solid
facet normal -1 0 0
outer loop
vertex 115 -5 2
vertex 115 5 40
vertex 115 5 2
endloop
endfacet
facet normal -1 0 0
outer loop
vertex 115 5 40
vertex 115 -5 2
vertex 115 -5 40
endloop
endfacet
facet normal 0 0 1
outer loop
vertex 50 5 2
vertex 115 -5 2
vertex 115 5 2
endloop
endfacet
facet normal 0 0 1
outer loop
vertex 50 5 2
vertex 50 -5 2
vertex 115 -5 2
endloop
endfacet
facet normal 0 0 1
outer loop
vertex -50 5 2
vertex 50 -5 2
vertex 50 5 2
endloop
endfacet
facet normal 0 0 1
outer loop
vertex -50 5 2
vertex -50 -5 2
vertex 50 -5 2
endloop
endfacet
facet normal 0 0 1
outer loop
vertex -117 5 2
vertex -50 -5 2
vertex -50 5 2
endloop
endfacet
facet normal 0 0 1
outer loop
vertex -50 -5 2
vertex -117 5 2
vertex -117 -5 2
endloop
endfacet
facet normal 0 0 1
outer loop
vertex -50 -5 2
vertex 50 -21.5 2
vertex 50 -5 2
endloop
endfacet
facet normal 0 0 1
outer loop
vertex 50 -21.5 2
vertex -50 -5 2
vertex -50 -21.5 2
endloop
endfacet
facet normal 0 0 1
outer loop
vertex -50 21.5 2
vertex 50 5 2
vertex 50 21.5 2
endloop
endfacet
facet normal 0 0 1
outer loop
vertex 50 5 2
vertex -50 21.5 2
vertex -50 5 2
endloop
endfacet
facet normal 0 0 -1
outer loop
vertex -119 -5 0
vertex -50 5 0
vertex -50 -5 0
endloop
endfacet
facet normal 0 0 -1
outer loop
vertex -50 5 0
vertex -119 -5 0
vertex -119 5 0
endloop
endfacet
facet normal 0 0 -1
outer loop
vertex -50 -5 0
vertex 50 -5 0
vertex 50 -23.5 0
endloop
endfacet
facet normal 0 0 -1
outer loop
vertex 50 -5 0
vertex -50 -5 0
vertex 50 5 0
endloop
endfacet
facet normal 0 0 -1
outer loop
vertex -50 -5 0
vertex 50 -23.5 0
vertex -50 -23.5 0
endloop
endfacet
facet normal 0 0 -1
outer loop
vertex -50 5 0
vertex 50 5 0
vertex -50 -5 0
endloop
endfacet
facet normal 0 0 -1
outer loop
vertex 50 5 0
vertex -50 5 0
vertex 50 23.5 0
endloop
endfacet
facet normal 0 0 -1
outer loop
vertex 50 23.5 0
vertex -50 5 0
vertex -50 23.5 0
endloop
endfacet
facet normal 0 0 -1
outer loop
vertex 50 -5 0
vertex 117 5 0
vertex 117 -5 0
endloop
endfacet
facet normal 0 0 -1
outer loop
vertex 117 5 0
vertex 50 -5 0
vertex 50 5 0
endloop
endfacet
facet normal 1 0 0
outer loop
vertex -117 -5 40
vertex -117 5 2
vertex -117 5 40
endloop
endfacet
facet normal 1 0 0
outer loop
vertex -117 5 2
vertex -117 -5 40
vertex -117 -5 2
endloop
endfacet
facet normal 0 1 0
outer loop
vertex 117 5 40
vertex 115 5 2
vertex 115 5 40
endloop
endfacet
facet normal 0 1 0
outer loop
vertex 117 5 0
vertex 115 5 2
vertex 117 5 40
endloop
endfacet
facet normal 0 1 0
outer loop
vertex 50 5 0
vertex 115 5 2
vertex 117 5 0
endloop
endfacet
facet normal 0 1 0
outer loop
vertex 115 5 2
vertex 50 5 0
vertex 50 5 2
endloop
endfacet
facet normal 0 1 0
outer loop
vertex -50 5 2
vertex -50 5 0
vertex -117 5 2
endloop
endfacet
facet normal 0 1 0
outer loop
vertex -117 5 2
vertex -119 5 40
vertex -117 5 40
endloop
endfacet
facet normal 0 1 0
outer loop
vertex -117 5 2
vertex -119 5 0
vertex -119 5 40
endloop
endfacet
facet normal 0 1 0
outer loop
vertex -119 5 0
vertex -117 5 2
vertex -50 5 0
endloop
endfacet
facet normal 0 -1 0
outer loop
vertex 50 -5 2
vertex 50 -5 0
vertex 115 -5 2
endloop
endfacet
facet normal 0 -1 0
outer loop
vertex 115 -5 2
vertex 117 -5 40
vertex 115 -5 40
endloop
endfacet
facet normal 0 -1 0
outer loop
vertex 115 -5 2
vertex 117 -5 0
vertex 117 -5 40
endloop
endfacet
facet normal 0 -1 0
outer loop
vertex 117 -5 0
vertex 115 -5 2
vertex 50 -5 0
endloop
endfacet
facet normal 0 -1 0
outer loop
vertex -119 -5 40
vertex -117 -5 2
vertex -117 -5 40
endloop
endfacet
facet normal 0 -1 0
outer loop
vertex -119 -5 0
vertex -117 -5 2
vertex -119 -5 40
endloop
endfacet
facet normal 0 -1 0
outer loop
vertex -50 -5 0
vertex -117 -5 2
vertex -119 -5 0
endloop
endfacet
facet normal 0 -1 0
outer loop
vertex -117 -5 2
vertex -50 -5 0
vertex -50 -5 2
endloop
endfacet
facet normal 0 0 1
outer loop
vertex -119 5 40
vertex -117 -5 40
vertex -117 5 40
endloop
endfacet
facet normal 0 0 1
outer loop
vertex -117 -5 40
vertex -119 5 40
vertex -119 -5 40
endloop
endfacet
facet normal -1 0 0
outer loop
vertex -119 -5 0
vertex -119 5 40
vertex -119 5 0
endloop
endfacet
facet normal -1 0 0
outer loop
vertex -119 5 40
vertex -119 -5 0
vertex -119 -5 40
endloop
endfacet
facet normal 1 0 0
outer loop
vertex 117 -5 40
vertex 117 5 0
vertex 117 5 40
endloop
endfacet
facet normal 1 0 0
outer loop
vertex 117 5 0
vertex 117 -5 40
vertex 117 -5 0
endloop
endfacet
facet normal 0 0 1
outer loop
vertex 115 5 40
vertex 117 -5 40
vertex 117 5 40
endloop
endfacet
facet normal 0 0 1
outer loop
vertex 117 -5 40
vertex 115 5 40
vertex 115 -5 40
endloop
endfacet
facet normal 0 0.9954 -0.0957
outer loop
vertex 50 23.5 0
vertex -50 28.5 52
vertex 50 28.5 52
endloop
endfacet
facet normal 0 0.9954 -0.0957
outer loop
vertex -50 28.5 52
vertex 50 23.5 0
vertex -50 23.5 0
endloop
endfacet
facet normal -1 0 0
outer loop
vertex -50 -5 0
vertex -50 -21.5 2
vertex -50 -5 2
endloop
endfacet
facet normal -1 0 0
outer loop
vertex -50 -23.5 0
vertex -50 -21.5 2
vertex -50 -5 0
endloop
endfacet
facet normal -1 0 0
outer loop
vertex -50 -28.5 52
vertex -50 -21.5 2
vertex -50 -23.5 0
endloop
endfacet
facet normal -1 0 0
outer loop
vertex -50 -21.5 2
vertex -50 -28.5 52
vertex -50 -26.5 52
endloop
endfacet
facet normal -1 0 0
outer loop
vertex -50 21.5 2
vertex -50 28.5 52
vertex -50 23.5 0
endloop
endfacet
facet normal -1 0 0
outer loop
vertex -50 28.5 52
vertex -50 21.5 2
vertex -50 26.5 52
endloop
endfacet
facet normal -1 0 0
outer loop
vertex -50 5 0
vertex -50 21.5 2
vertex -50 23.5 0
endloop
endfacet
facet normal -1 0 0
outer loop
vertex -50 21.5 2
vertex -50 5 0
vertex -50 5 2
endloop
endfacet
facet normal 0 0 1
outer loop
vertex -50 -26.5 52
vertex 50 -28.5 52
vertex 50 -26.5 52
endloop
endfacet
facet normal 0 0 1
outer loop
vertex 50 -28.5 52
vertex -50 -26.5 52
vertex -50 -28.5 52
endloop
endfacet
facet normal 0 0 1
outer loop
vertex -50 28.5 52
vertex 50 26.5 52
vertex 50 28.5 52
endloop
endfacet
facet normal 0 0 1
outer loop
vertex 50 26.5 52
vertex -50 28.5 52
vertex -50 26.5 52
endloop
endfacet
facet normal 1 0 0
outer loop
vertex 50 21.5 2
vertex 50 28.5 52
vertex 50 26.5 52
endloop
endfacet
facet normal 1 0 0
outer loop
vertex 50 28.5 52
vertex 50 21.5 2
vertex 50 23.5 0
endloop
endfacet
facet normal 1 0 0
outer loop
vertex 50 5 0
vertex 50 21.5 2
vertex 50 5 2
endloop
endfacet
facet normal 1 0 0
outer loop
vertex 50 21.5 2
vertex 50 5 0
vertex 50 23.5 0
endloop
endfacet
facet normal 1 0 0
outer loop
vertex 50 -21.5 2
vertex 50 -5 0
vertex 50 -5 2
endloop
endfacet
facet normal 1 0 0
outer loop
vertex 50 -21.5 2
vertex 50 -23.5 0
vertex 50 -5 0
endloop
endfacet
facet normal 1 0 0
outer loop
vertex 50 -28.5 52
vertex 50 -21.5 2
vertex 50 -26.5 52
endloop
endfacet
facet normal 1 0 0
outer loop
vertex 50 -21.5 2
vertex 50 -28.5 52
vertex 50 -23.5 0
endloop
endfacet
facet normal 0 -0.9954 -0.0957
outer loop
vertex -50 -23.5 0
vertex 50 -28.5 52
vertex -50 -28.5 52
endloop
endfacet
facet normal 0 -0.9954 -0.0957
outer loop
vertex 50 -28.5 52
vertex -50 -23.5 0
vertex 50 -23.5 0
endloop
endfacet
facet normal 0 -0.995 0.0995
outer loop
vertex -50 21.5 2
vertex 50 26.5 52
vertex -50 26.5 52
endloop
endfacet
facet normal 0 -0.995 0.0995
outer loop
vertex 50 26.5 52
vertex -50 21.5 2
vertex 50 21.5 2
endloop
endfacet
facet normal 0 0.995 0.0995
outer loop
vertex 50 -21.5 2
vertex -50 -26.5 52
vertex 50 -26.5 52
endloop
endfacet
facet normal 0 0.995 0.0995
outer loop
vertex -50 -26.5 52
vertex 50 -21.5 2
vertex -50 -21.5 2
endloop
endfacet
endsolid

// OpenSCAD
module pocket(coverlength=10)
{
  wall=2;
  bottomwidth=43;
  topwidth=48;
  pocketheight=50;
  
  rotate([90,0,90])
  translate([-bottomwidth/2,wall,-coverlength/2])
  difference()
  {
    linear_extrude(height=coverlength) polygon([[0-wall,0-wall],[bottomwidth+wall,0-wall],[topwidth+wall,pocketheight],[-5-wall,pocketheight]]);
    linear_extrude(height=coverlength) polygon([[0,0],[bottomwidth,0],[topwidth,pocketheight],[-5,pocketheight]]);
  }
}


module strip(earheight=10)
{
  wall=2;
  stripwidth=10;
  coverlength=232;
  translate([-(coverlength+wall)/2,-stripwidth/2,0])
  {  
    cube([coverlength,stripwidth,wall]);
    translate([-wall,0,0])cube([wall,stripwidth,earheight]);
    translate([coverlength,0,0])cube([wall,stripwidth,earheight]);
  }
}

strip(40);

pocket(100);
